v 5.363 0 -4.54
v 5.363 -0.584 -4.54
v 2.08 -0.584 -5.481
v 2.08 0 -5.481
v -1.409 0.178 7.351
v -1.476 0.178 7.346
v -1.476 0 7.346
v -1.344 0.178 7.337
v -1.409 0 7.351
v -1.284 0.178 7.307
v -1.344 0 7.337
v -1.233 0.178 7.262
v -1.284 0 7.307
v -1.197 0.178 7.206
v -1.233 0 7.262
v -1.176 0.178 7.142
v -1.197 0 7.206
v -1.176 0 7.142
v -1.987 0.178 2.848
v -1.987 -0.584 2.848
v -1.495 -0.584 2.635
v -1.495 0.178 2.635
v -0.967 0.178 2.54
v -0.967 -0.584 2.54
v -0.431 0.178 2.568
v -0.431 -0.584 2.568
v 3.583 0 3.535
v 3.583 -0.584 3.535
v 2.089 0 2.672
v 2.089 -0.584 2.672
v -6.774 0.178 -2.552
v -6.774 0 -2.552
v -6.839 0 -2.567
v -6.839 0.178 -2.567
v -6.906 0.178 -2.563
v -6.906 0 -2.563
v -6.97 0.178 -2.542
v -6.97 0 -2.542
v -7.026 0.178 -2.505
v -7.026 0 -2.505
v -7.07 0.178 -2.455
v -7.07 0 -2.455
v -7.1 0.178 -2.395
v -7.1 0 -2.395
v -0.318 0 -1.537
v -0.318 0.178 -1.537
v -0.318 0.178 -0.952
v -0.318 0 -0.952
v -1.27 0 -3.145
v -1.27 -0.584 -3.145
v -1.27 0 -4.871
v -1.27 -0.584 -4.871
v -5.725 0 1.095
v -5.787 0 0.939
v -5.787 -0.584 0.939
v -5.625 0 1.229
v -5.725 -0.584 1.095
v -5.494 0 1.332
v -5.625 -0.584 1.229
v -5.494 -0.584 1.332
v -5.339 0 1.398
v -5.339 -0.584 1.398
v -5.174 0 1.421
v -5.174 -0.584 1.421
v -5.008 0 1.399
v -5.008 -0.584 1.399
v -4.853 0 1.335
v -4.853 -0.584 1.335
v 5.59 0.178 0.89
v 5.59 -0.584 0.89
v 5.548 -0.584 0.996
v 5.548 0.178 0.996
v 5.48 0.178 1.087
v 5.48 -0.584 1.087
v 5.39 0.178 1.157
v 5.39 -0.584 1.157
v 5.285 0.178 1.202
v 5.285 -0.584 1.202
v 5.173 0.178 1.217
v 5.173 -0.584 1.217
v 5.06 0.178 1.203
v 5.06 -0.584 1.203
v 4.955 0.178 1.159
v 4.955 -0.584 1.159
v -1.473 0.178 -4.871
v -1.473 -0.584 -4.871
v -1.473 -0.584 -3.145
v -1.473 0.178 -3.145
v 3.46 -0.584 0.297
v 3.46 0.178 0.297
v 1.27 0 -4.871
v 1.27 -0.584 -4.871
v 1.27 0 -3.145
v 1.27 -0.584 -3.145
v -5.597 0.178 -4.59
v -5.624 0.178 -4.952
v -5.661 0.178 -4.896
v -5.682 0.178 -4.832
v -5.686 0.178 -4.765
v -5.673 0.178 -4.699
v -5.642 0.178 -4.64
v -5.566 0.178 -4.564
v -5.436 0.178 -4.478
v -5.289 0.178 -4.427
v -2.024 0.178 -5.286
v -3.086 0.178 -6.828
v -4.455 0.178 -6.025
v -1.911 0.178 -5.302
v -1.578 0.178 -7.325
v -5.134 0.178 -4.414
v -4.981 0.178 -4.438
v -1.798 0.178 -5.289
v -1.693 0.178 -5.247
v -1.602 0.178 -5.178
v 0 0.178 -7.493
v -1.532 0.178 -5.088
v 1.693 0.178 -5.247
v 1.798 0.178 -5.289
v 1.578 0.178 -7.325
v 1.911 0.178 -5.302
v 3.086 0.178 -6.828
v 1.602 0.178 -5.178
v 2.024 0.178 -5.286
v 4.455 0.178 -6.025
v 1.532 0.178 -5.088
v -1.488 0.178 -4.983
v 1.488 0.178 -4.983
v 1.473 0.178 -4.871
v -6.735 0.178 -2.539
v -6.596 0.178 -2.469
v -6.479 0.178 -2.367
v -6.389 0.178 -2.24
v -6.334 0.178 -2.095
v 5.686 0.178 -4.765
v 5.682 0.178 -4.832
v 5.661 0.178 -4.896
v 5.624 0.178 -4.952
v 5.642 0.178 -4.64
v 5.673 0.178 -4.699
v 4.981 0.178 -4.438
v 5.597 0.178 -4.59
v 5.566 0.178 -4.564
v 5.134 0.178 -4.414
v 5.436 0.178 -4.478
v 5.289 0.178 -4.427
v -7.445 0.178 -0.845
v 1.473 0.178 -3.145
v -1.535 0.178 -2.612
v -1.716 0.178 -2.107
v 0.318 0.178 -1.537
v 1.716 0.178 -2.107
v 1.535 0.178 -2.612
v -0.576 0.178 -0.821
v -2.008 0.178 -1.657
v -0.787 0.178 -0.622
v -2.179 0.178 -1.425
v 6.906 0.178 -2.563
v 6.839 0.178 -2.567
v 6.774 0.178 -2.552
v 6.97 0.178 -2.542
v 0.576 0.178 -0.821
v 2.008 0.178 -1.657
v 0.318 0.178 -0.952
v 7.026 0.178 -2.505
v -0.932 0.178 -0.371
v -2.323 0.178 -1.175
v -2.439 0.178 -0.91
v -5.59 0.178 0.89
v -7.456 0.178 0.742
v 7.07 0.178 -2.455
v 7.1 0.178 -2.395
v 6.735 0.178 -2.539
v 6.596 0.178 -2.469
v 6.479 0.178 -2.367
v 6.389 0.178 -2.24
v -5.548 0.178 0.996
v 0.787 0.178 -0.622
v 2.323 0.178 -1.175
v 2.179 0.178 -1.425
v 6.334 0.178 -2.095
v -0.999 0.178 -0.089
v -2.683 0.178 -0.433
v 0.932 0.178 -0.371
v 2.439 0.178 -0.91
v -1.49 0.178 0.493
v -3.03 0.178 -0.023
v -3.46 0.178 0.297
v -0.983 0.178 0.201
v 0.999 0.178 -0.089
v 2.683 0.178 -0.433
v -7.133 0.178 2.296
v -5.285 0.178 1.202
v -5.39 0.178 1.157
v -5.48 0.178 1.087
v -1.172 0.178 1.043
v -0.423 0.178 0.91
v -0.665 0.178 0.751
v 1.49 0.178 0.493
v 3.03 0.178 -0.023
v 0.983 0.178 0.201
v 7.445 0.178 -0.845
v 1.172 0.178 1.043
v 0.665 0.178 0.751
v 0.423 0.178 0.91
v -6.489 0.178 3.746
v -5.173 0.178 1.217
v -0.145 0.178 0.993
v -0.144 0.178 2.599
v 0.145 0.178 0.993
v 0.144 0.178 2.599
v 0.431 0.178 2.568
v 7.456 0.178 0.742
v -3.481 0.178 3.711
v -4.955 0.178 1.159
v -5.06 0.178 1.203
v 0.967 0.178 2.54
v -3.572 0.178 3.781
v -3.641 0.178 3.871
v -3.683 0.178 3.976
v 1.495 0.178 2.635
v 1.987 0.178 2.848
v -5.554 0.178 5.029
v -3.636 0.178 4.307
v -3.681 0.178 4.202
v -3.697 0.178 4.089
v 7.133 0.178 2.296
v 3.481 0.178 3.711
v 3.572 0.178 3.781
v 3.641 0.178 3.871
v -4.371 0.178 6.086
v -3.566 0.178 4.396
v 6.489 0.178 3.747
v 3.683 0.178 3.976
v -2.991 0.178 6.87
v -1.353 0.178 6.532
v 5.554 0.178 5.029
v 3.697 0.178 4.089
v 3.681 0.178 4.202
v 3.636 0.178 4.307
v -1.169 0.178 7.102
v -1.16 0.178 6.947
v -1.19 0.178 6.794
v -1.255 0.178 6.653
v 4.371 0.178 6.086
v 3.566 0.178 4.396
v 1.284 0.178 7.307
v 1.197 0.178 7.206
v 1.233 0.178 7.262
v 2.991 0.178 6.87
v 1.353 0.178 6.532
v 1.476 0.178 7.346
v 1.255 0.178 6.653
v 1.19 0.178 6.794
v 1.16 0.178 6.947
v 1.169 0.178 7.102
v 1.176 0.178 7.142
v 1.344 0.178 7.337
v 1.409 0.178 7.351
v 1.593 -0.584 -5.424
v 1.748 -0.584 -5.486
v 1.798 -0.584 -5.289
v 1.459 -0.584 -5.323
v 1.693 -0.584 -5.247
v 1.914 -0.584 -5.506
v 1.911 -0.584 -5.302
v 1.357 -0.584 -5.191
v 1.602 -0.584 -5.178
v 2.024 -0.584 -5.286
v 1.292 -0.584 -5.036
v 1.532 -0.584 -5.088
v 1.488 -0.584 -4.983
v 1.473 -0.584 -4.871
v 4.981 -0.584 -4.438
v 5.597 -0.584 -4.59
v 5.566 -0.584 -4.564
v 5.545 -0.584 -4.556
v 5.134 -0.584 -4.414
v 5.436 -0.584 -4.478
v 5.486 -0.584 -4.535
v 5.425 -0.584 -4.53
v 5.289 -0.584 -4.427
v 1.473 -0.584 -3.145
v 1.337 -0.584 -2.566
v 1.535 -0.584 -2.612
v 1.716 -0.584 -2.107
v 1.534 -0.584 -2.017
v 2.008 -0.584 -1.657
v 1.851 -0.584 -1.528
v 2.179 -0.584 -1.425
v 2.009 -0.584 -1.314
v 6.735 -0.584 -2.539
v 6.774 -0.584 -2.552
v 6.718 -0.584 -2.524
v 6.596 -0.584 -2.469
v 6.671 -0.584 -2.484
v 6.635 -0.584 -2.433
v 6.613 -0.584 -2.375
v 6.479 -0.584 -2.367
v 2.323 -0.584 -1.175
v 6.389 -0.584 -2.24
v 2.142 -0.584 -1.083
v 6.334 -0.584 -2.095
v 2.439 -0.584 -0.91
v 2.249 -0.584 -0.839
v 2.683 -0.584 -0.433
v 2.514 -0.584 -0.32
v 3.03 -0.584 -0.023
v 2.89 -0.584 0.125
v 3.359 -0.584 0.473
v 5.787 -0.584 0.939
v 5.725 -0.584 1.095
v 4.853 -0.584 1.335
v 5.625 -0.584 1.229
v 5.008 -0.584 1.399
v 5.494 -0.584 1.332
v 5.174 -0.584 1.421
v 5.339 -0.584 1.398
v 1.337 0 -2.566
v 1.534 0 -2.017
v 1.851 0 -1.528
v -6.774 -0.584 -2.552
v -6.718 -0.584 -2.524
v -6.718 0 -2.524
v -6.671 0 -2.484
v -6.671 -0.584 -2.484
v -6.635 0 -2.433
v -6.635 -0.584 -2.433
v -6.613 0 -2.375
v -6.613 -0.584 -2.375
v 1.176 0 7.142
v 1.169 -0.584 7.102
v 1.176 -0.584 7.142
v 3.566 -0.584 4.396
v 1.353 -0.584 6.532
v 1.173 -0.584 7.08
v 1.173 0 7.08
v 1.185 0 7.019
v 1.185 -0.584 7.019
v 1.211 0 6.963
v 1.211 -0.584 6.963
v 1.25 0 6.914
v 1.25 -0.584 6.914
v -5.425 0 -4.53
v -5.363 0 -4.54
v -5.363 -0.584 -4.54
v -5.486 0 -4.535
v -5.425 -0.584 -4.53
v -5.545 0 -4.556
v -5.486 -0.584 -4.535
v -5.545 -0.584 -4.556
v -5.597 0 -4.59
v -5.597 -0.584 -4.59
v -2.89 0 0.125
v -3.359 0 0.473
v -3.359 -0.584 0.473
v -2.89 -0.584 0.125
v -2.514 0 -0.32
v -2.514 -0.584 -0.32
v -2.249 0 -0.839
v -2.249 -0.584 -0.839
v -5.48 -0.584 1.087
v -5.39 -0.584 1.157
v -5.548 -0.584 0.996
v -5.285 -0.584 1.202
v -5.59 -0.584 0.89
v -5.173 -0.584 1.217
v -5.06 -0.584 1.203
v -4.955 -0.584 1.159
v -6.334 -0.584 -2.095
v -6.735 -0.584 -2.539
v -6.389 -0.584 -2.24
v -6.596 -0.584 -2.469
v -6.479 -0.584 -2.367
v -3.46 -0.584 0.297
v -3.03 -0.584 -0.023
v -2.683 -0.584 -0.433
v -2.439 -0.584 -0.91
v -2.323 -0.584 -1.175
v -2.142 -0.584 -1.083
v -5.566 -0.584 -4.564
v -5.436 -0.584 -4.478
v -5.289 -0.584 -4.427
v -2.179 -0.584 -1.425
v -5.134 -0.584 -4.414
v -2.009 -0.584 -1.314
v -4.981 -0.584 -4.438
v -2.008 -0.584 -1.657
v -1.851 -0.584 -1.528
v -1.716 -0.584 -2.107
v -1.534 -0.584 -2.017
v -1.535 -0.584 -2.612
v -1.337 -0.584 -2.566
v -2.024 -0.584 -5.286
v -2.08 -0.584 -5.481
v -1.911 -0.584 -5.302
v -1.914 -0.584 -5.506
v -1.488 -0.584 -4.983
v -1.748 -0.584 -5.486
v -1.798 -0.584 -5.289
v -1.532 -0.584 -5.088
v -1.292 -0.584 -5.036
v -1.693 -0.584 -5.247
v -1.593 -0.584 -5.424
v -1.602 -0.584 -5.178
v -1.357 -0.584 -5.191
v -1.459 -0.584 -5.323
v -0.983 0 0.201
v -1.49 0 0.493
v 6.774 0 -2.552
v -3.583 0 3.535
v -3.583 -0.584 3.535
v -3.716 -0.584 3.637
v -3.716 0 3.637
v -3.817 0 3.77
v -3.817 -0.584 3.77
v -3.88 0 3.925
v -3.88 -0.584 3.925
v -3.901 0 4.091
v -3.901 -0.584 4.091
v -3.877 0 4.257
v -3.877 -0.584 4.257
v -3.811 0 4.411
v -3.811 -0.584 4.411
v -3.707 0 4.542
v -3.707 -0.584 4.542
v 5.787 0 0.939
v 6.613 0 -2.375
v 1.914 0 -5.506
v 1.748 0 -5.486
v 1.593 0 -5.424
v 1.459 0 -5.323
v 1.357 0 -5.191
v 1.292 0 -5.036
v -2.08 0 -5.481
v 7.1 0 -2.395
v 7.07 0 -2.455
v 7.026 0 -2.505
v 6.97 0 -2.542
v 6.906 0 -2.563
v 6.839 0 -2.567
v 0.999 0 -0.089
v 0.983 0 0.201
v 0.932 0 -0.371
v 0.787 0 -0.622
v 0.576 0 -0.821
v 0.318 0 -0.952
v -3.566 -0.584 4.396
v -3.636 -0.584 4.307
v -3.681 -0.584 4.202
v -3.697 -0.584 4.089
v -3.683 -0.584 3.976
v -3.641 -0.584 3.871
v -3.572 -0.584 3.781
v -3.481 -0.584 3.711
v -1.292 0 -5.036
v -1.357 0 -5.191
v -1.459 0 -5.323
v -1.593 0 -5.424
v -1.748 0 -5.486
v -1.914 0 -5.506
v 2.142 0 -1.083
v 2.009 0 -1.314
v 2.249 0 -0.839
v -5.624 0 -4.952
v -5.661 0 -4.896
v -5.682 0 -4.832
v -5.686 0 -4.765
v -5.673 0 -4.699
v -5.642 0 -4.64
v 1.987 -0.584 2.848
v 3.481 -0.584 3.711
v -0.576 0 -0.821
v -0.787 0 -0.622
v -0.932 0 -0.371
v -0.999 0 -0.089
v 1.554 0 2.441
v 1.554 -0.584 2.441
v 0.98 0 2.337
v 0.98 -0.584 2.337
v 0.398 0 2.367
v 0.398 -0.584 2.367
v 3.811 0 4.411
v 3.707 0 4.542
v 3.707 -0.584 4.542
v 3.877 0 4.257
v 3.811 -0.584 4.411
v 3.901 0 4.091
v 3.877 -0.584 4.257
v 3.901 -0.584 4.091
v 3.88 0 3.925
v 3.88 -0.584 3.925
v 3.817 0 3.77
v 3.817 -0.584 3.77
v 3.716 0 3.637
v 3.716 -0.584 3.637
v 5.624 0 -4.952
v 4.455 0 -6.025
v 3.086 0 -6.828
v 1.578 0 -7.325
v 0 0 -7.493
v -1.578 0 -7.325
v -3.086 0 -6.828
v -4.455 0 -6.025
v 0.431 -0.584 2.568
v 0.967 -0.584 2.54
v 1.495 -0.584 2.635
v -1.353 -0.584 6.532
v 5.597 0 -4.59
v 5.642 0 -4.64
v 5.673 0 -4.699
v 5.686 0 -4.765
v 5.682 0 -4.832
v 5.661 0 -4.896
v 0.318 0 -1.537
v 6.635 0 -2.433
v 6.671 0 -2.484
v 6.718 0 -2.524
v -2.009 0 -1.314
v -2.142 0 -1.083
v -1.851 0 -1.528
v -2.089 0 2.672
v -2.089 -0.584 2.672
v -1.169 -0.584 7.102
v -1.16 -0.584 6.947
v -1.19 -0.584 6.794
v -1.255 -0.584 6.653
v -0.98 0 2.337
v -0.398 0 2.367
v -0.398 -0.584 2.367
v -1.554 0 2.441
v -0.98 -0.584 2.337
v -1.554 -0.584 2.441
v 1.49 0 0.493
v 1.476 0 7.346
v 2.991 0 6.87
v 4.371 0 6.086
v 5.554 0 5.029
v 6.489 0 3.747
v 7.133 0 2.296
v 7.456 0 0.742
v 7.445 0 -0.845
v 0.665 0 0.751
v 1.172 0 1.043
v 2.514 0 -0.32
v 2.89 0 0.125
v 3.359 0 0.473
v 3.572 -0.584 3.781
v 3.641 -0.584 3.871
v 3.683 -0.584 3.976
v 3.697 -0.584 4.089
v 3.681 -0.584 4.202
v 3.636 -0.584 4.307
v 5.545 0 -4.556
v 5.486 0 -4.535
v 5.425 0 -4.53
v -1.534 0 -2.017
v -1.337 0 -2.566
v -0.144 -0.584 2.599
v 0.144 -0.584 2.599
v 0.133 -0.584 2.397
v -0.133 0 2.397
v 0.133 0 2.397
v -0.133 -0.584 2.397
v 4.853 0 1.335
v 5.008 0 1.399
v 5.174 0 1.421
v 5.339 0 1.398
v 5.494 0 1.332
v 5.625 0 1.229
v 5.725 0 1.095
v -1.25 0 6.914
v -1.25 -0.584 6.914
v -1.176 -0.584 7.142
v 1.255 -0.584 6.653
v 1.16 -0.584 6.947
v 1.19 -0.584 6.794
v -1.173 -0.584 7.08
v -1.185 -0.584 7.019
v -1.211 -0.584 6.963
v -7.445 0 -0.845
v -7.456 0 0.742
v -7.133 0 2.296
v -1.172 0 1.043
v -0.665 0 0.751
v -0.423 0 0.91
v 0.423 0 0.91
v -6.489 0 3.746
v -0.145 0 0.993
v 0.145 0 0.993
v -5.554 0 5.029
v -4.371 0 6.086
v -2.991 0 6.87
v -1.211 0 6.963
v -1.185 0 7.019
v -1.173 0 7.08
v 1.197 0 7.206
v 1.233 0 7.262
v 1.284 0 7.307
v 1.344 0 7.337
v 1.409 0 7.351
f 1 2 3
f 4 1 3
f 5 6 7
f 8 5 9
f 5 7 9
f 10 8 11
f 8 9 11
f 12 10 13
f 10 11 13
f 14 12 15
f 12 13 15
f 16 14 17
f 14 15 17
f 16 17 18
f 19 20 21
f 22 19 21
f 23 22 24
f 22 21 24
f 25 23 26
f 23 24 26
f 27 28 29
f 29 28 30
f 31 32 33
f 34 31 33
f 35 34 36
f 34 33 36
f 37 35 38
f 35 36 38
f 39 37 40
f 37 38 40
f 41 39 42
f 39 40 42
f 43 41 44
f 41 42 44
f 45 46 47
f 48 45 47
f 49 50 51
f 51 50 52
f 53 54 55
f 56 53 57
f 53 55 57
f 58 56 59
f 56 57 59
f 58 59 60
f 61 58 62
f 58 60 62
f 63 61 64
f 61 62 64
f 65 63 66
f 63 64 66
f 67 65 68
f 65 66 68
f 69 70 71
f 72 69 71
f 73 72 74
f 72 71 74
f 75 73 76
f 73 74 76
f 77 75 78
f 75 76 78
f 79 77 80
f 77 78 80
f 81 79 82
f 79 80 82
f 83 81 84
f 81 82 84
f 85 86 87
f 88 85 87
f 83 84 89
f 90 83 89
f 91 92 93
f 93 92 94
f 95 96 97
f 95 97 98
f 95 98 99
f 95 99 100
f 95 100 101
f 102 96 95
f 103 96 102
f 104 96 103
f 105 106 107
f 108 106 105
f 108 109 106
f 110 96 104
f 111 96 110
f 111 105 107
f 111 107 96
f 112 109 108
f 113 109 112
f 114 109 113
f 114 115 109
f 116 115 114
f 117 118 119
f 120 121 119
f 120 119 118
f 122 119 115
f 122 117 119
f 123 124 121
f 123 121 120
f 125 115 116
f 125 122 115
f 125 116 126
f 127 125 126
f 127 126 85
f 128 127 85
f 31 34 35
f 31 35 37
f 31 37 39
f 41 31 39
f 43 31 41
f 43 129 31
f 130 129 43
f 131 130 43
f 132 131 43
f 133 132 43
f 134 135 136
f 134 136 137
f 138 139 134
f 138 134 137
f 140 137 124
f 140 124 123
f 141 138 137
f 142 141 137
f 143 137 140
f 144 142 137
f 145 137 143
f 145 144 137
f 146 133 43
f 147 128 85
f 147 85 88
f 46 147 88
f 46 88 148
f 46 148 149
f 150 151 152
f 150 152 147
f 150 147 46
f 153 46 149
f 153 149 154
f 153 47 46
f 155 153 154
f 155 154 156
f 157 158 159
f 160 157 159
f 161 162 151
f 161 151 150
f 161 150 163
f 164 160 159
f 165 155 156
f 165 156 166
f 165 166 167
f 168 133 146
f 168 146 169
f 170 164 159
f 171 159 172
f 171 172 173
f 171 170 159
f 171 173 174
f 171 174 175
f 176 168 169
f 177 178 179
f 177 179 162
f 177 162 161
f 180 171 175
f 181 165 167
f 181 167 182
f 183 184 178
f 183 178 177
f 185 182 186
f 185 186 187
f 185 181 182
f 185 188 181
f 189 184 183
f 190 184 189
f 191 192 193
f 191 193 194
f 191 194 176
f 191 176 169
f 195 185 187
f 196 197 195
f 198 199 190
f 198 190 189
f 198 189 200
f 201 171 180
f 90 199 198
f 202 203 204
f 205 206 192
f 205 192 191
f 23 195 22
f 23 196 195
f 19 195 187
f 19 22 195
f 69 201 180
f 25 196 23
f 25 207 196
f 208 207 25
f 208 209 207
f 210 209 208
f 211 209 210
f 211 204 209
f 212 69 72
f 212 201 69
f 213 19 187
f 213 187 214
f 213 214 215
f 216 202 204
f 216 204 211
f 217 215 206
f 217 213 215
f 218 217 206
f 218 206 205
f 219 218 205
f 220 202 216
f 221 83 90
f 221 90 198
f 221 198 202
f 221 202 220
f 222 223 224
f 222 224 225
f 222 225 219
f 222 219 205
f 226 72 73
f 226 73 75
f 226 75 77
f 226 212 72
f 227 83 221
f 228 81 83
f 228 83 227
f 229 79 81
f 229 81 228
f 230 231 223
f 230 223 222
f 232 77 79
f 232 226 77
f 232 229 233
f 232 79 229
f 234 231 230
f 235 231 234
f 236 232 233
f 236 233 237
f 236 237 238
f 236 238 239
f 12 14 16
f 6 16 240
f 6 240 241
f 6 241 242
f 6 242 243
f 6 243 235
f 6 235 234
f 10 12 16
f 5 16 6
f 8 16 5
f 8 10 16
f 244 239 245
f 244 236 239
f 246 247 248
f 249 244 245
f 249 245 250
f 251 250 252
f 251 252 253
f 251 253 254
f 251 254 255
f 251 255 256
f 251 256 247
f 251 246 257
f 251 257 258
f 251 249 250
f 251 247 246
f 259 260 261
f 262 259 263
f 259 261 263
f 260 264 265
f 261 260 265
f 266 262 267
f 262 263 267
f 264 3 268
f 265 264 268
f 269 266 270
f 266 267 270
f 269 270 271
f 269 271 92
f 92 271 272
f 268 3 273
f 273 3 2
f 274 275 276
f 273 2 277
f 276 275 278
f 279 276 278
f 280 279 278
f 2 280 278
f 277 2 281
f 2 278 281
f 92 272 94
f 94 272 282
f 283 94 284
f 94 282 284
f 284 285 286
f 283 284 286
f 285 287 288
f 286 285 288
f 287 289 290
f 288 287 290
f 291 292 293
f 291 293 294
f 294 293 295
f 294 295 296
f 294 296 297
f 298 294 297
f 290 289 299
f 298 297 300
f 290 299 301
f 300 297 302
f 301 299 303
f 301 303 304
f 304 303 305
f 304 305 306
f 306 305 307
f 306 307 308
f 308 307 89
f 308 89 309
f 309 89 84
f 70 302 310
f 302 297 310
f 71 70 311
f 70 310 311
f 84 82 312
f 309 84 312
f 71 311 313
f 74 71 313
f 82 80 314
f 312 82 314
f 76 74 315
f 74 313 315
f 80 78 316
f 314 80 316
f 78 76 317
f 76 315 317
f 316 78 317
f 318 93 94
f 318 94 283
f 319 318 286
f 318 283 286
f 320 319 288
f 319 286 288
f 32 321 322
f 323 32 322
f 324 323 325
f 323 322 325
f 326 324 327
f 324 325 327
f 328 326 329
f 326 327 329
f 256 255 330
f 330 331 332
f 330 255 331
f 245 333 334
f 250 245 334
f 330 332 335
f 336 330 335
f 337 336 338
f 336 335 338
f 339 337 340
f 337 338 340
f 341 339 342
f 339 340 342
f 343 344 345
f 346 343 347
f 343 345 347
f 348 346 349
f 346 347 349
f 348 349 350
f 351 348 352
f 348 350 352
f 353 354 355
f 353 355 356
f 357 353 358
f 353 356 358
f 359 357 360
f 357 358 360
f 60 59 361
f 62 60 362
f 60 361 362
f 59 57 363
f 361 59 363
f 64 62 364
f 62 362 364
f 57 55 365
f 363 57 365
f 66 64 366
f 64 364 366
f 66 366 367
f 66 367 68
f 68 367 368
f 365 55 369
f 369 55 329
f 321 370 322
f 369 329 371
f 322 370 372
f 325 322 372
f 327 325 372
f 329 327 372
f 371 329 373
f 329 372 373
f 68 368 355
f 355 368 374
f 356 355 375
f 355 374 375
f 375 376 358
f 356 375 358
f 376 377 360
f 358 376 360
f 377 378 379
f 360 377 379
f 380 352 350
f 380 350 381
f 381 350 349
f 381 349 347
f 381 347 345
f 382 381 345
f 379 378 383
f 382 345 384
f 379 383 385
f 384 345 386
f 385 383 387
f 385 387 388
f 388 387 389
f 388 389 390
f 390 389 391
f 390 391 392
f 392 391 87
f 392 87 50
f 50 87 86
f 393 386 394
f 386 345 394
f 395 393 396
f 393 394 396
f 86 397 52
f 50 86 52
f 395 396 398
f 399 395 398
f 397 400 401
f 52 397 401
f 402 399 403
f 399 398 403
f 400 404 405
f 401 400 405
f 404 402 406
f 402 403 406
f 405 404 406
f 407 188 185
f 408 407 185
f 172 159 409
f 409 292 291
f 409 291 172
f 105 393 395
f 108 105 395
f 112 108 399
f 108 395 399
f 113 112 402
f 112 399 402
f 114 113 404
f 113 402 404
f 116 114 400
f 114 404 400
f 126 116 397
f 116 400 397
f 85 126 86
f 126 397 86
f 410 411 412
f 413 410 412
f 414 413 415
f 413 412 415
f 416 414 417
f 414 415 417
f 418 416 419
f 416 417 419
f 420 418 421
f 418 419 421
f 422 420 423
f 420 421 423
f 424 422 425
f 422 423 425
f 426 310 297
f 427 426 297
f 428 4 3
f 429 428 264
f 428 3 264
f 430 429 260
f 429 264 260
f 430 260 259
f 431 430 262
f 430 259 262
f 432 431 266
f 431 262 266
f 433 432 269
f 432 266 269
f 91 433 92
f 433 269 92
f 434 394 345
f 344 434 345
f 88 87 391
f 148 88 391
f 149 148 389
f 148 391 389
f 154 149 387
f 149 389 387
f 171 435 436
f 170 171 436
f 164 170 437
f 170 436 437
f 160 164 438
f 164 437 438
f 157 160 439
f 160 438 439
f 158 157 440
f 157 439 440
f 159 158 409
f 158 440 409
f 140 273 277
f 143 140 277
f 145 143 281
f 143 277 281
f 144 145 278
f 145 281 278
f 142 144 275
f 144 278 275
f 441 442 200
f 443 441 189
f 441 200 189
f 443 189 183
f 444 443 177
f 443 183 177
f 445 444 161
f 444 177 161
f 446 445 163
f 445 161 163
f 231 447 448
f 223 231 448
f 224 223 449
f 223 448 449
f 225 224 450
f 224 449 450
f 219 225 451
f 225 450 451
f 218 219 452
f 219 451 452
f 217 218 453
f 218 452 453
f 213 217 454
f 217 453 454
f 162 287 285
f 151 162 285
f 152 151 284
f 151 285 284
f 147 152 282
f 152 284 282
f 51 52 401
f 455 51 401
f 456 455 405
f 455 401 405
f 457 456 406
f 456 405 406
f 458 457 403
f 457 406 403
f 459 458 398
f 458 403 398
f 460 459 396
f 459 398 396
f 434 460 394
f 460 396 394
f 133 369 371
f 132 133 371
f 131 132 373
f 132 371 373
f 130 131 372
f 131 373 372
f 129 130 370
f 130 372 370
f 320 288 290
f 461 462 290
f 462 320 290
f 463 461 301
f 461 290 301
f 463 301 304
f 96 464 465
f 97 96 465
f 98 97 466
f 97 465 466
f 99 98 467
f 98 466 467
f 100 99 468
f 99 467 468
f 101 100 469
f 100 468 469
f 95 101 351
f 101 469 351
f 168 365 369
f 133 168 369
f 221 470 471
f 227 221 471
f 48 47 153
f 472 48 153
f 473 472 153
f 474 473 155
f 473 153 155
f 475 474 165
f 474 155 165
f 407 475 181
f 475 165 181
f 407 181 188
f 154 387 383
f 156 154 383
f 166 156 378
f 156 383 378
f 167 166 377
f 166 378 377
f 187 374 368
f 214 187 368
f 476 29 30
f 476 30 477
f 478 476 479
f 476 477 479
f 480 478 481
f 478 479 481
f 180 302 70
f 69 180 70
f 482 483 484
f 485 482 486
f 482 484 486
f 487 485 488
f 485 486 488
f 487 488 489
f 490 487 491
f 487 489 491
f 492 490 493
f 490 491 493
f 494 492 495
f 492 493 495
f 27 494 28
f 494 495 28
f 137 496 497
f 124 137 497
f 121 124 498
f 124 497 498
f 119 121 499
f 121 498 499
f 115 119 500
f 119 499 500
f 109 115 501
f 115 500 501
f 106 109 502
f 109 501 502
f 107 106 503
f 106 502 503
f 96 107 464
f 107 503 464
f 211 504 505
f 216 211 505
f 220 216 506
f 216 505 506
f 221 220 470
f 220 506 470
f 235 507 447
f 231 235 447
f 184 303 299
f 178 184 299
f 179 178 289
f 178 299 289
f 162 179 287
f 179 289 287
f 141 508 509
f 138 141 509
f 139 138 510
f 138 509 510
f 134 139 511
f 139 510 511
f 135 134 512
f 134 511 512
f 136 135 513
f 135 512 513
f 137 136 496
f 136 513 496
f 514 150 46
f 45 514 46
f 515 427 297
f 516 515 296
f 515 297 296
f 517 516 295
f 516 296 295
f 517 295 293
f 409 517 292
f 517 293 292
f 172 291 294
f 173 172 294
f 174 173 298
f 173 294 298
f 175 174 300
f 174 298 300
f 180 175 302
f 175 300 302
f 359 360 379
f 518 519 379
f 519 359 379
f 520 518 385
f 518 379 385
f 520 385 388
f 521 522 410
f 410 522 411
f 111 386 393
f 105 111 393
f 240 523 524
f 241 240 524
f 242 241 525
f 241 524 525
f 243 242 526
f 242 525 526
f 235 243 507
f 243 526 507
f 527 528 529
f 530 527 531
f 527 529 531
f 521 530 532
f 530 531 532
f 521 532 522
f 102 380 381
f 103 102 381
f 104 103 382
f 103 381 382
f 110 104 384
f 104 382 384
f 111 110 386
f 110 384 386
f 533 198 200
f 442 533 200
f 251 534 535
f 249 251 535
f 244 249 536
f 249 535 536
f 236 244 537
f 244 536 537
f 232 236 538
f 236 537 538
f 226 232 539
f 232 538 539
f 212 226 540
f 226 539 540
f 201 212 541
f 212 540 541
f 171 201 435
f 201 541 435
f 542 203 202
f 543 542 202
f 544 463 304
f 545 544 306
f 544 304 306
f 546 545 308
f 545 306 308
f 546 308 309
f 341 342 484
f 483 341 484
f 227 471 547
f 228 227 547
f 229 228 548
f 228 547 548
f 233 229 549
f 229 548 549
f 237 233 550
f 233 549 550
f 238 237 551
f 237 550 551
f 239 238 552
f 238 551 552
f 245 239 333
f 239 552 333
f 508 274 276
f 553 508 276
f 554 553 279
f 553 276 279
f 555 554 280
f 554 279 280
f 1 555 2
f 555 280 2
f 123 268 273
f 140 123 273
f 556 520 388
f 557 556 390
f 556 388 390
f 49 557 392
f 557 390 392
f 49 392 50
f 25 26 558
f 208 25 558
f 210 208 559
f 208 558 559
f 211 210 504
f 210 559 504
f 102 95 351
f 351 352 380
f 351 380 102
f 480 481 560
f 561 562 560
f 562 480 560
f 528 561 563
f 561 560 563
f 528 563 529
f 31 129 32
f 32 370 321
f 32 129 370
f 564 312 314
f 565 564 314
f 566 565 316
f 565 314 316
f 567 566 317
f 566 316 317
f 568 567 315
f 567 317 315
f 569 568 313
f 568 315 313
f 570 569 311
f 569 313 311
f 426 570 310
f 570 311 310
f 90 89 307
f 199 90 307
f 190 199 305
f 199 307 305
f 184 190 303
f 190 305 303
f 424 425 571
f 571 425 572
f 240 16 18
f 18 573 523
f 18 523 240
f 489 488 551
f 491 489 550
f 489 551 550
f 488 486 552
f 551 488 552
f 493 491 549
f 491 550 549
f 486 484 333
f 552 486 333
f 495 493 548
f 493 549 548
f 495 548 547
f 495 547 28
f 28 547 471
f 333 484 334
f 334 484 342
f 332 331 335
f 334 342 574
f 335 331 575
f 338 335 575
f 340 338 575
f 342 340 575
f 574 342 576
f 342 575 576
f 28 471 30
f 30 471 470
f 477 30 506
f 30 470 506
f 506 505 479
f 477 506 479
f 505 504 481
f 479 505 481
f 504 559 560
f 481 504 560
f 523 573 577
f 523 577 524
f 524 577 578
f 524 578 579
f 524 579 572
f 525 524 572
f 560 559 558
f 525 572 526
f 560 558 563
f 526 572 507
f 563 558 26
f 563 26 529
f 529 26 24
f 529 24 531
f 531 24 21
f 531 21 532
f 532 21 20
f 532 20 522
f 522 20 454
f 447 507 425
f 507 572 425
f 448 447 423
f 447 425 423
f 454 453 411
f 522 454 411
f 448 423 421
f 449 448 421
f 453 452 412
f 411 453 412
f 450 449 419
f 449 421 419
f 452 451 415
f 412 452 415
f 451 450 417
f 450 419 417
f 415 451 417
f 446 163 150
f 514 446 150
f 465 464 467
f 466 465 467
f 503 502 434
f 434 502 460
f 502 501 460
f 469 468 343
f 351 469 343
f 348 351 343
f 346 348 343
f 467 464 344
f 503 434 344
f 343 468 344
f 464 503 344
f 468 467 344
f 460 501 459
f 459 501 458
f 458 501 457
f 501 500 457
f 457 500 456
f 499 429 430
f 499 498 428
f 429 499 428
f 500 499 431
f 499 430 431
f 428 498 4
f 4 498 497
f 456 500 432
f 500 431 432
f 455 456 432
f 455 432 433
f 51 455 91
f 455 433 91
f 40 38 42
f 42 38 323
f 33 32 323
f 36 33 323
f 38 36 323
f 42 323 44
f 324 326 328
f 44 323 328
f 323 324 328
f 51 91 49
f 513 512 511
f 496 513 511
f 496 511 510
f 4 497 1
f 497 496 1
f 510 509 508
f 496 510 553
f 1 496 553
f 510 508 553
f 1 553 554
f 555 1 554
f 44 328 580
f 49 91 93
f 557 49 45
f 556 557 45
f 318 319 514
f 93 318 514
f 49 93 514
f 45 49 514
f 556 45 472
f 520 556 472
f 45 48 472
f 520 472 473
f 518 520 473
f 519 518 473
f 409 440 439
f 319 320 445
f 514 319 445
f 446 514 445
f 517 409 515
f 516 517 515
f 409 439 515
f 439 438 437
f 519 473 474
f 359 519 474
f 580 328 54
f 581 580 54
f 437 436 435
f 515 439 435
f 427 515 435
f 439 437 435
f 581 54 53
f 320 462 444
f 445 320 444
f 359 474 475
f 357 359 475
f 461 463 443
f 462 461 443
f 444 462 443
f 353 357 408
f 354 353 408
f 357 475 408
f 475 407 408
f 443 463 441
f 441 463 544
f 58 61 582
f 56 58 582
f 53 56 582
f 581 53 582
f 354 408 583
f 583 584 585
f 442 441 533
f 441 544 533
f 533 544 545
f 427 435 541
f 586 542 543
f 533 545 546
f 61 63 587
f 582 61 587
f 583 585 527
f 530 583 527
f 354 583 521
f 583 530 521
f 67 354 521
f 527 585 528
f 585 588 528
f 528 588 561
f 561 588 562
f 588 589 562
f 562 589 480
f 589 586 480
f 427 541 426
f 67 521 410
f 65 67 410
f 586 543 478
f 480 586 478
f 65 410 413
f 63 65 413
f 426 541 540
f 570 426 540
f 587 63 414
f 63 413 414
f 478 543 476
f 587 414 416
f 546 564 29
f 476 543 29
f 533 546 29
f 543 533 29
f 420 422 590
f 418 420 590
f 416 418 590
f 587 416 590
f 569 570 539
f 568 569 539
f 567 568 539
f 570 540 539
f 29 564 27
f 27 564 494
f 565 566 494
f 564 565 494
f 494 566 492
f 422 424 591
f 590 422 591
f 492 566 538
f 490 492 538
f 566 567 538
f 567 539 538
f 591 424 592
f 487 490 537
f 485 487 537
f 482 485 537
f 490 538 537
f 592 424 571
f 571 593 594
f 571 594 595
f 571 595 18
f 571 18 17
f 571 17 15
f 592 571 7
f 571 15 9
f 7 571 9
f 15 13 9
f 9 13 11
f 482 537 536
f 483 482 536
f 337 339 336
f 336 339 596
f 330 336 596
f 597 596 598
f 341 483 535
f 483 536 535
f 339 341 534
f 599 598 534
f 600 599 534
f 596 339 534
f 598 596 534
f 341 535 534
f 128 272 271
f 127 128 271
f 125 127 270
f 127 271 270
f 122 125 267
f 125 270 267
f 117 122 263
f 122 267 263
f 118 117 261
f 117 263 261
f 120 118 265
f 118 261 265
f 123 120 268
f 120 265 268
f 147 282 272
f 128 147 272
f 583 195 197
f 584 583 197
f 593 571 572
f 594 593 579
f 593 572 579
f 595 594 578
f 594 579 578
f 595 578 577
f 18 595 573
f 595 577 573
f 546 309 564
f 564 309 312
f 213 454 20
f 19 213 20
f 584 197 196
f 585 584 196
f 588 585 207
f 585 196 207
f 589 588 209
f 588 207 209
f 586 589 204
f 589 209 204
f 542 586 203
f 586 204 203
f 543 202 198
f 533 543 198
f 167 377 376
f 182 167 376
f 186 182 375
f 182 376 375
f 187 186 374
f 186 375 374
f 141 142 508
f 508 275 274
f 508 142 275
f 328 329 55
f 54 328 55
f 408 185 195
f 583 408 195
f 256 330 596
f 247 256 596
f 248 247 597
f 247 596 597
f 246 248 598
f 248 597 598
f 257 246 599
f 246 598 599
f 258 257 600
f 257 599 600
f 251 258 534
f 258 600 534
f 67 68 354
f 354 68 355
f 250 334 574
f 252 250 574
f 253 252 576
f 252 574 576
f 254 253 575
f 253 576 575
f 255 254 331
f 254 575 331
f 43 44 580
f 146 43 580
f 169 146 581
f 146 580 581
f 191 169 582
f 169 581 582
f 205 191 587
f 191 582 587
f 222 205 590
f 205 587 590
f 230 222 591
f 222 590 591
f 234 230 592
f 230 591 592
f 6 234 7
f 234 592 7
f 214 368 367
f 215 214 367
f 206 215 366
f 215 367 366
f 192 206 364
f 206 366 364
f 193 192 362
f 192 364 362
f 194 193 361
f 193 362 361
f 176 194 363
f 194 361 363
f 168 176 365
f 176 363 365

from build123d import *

# Parameters (mm, degrees)
SKETCH1_R           = 2.4003
BOSS_EXTRUDE1_DEPTH = 0.1778
CIRPATTERN1_COUNT   = 3
SKETCH2_R           = 1.0033
CUT_EXTRUDE3_DEPTH  = 11.598193754
CIRPATTERN2_COUNT   = 3
FILLET1_R           = 2.54
BOSS_EXTRUDE2_START = -0.762
BOSS_EXTRUDE2_DEPTH = 0.762
CIRPATTERN3_COUNT   = 3


with BuildPart() as part:
    # Sketch1 → Boss-Extrude1 (new body)
    with BuildSketch(Plane(origin=(0, 0, 0), x_dir=(1, 0, 0), z_dir=(0, 1, 0))):
        with BuildLine():
            ThreePointArc((-2.080029721, 5.48099038), (-1.52284746, 5.377722752), (-1.27, 4.870589203))
            Line((-1.27, 4.870589203), (-1.27, 2.036796526))
            ThreePointArc((-1.27, 2.036796526), (0, 2.4003), (1.27, 2.036796526))
            Line((1.27, 2.036796526), (1.27, 4.870589203))
            ThreePointArc((1.27, 4.870589203), (1.52284746, 5.377722752), (2.080029721, 5.48099038))
            Line((2.080029721, 5.48099038), (5.363123917, 4.539578268))
            ThreePointArc((5.363123917, 4.539578268), (5.647788598, 4.647944118), (5.62377215, 4.951589221))
            ThreePointArc((5.62377215, 4.951589221), (0, 7.493), (-5.62377215, 4.951589221))
            ThreePointArc((-5.62377215, 4.951589221), (-5.647788598, 4.647944118), (-5.363123917, 4.539578268))
            Line((-5.363123917, 4.539578268), (-2.080029721, 5.48099038))
        make_face()
        Circle(SKETCH1_R)
    boss_extrude1 = extrude(amount=BOSS_EXTRUDE1_DEPTH)

    # CirPattern1: Boss-Extrude1 ×3 about axis
    cirpattern1_axis = Axis((0, 0, 0), (0, 1, 0))
    for i in range(1, CIRPATTERN1_COUNT):
        add(boss_extrude1.rotate(cirpattern1_axis, i * 360 / CIRPATTERN1_COUNT))

    # Sketch2 → Cut-Extrude3 (cut, through all)
    with BuildSketch(Plane(origin=(0, 0.1778, 0), x_dir=(1, 0, 0), z_dir=(0, 1, 0))):
        Circle(SKETCH2_R)
        with BuildLine():
            Line((0.3175, 0.951737695), (0.3175, 1.5367))
            Line((0.3175, 1.5367), (-0.3175, 1.5367))
            Line((-0.3175, 1.5367), (-0.3175, 0.951737695))
            ThreePointArc((-0.3175, 0.951737695), (0, 1.0033), (0.3175, 0.951737695))
        make_face()
    cut_extrude3 = extrude(amount=-CUT_EXTRUDE3_DEPTH, mode=Mode.SUBTRACT)

    # CirPattern2: Cut-Extrude3 ×3 about axis
    cirpattern2_axis = Axis((0, 0, 0), (0, 1, 0))
    for i in range(1, CIRPATTERN2_COUNT):
        add(cut_extrude3.rotate(cirpattern2_axis, i * 360 / CIRPATTERN2_COUNT), mode=Mode.SUBTRACT)

    # Fillet1
    fillet1_edges = [part.edges().sort_by_distance(p)[0] for p in [
        (1.27, 0.0889, -2.036796526),
        (-1.27, 0.0889, -2.036796526),
        (2.398917534, 0.0889, -0.081454),
        (-1.128917534, 0.0889, 2.118250526),
        (-2.398917534, 0.0889, -0.081454),
        (1.128917534, 0.0889, 2.118250526),
    ]]
    fillet(fillet1_edges, radius=FILLET1_R)

    # Sketch3 → Boss-Extrude2 (add)
    with BuildSketch(Plane(origin=(0, 0.1778, 0), x_dir=(1, 0, 0), z_dir=(0, 1, 0)).offset(BOSS_EXTRUDE2_START)):
        with BuildLine():
            Line((-4.980841253, 4.437807212), (-2.02402021, 5.285662003))
            ThreePointArc((-2.02402021, 5.285662003), (-1.645136273, 5.215440016), (-1.4732, 4.870589203))
            Line((-1.4732, 4.870589203), (-1.4732, 3.144910824))
            ThreePointArc((-1.4732, 3.144910824), (-1.610918341, 2.354547555), (-2.007840617, 1.65734375))
            ThreePointArc((-2.007840617, 1.65734375), (-2.254697139, 1.30175), (-2.439222099, 0.910169106))
            ThreePointArc((-2.439222099, 0.910169106), (-2.844557167, 0.217822429), (-3.460172666, -0.296626787))
            Line((-3.460172666, -0.296626787), (-4.954653981, -1.159465976))
            ThreePointArc((-4.954653981, -1.159465976), (-5.339271682, -1.182990203), (-5.589527676, -0.889978082))
            Line((-5.589527676, -0.889978082), (-6.33367441, 2.094631451))
            ThreePointArc((-6.33367441, 2.094631451), (-6.478847097, 2.366941647), (-6.73524563, 2.538661605))
            Line((-6.73524563, 2.538661605), (-6.773580549, 2.552424483))
            ThreePointArc((-6.773580549, 2.552424483), (-6.671021136, 2.4837365), (-6.612952061, 2.374812422))
            Line((-6.612952061, 2.374812422), (-5.786691767, -0.939136611))
            ThreePointArc((-5.786691767, -0.939136611), (-5.418668247, -1.370036789), (-4.853053981, -1.335442339))
            Line((-4.853053981, -1.335442339), (-3.358572666, -0.472603149))
            ThreePointArc((-3.358572666, -0.472603149), (-2.689425385, 0.086580782), (-2.248843789, 0.839131517))
            ThreePointArc((-2.248843789, 0.839131517), (-2.078720777, 1.20015), (-1.851131105, 1.527990092))
            ThreePointArc((-1.851131105, 1.527990092), (-1.419693849, 2.285820314), (-1.27, 3.144910824))
            Line((-1.27, 3.144910824), (-1.27, 4.870589203))
            ThreePointArc((-1.27, 4.870589203), (-1.52284746, 5.377722752), (-2.080029721, 5.48099038))
            Line((-2.080029721, 5.48099038), (-5.363123917, 4.539578268))
            ThreePointArc((-5.363123917, 4.539578268), (-5.486489473, 4.535405523), (-5.597254718, 4.589880588))
            Line((-5.597254718, 4.589880588), (-5.566168256, 4.563563014))
            ThreePointArc((-5.566168256, 4.563563014), (-5.289255144, 4.42737535), (-4.980841253, 4.437807212))
        make_face()
    boss_extrude2 = extrude(amount=BOSS_EXTRUDE2_DEPTH)

    # CirPattern3: Boss-Extrude2 ×3 about axis
    cirpattern3_axis = Axis((0, 0, 0), (0, 1, 0))
    for i in range(1, CIRPATTERN3_COUNT):
        add(boss_extrude2.rotate(cirpattern3_axis, i * 360 / CIRPATTERN3_COUNT))


solid = part.part
